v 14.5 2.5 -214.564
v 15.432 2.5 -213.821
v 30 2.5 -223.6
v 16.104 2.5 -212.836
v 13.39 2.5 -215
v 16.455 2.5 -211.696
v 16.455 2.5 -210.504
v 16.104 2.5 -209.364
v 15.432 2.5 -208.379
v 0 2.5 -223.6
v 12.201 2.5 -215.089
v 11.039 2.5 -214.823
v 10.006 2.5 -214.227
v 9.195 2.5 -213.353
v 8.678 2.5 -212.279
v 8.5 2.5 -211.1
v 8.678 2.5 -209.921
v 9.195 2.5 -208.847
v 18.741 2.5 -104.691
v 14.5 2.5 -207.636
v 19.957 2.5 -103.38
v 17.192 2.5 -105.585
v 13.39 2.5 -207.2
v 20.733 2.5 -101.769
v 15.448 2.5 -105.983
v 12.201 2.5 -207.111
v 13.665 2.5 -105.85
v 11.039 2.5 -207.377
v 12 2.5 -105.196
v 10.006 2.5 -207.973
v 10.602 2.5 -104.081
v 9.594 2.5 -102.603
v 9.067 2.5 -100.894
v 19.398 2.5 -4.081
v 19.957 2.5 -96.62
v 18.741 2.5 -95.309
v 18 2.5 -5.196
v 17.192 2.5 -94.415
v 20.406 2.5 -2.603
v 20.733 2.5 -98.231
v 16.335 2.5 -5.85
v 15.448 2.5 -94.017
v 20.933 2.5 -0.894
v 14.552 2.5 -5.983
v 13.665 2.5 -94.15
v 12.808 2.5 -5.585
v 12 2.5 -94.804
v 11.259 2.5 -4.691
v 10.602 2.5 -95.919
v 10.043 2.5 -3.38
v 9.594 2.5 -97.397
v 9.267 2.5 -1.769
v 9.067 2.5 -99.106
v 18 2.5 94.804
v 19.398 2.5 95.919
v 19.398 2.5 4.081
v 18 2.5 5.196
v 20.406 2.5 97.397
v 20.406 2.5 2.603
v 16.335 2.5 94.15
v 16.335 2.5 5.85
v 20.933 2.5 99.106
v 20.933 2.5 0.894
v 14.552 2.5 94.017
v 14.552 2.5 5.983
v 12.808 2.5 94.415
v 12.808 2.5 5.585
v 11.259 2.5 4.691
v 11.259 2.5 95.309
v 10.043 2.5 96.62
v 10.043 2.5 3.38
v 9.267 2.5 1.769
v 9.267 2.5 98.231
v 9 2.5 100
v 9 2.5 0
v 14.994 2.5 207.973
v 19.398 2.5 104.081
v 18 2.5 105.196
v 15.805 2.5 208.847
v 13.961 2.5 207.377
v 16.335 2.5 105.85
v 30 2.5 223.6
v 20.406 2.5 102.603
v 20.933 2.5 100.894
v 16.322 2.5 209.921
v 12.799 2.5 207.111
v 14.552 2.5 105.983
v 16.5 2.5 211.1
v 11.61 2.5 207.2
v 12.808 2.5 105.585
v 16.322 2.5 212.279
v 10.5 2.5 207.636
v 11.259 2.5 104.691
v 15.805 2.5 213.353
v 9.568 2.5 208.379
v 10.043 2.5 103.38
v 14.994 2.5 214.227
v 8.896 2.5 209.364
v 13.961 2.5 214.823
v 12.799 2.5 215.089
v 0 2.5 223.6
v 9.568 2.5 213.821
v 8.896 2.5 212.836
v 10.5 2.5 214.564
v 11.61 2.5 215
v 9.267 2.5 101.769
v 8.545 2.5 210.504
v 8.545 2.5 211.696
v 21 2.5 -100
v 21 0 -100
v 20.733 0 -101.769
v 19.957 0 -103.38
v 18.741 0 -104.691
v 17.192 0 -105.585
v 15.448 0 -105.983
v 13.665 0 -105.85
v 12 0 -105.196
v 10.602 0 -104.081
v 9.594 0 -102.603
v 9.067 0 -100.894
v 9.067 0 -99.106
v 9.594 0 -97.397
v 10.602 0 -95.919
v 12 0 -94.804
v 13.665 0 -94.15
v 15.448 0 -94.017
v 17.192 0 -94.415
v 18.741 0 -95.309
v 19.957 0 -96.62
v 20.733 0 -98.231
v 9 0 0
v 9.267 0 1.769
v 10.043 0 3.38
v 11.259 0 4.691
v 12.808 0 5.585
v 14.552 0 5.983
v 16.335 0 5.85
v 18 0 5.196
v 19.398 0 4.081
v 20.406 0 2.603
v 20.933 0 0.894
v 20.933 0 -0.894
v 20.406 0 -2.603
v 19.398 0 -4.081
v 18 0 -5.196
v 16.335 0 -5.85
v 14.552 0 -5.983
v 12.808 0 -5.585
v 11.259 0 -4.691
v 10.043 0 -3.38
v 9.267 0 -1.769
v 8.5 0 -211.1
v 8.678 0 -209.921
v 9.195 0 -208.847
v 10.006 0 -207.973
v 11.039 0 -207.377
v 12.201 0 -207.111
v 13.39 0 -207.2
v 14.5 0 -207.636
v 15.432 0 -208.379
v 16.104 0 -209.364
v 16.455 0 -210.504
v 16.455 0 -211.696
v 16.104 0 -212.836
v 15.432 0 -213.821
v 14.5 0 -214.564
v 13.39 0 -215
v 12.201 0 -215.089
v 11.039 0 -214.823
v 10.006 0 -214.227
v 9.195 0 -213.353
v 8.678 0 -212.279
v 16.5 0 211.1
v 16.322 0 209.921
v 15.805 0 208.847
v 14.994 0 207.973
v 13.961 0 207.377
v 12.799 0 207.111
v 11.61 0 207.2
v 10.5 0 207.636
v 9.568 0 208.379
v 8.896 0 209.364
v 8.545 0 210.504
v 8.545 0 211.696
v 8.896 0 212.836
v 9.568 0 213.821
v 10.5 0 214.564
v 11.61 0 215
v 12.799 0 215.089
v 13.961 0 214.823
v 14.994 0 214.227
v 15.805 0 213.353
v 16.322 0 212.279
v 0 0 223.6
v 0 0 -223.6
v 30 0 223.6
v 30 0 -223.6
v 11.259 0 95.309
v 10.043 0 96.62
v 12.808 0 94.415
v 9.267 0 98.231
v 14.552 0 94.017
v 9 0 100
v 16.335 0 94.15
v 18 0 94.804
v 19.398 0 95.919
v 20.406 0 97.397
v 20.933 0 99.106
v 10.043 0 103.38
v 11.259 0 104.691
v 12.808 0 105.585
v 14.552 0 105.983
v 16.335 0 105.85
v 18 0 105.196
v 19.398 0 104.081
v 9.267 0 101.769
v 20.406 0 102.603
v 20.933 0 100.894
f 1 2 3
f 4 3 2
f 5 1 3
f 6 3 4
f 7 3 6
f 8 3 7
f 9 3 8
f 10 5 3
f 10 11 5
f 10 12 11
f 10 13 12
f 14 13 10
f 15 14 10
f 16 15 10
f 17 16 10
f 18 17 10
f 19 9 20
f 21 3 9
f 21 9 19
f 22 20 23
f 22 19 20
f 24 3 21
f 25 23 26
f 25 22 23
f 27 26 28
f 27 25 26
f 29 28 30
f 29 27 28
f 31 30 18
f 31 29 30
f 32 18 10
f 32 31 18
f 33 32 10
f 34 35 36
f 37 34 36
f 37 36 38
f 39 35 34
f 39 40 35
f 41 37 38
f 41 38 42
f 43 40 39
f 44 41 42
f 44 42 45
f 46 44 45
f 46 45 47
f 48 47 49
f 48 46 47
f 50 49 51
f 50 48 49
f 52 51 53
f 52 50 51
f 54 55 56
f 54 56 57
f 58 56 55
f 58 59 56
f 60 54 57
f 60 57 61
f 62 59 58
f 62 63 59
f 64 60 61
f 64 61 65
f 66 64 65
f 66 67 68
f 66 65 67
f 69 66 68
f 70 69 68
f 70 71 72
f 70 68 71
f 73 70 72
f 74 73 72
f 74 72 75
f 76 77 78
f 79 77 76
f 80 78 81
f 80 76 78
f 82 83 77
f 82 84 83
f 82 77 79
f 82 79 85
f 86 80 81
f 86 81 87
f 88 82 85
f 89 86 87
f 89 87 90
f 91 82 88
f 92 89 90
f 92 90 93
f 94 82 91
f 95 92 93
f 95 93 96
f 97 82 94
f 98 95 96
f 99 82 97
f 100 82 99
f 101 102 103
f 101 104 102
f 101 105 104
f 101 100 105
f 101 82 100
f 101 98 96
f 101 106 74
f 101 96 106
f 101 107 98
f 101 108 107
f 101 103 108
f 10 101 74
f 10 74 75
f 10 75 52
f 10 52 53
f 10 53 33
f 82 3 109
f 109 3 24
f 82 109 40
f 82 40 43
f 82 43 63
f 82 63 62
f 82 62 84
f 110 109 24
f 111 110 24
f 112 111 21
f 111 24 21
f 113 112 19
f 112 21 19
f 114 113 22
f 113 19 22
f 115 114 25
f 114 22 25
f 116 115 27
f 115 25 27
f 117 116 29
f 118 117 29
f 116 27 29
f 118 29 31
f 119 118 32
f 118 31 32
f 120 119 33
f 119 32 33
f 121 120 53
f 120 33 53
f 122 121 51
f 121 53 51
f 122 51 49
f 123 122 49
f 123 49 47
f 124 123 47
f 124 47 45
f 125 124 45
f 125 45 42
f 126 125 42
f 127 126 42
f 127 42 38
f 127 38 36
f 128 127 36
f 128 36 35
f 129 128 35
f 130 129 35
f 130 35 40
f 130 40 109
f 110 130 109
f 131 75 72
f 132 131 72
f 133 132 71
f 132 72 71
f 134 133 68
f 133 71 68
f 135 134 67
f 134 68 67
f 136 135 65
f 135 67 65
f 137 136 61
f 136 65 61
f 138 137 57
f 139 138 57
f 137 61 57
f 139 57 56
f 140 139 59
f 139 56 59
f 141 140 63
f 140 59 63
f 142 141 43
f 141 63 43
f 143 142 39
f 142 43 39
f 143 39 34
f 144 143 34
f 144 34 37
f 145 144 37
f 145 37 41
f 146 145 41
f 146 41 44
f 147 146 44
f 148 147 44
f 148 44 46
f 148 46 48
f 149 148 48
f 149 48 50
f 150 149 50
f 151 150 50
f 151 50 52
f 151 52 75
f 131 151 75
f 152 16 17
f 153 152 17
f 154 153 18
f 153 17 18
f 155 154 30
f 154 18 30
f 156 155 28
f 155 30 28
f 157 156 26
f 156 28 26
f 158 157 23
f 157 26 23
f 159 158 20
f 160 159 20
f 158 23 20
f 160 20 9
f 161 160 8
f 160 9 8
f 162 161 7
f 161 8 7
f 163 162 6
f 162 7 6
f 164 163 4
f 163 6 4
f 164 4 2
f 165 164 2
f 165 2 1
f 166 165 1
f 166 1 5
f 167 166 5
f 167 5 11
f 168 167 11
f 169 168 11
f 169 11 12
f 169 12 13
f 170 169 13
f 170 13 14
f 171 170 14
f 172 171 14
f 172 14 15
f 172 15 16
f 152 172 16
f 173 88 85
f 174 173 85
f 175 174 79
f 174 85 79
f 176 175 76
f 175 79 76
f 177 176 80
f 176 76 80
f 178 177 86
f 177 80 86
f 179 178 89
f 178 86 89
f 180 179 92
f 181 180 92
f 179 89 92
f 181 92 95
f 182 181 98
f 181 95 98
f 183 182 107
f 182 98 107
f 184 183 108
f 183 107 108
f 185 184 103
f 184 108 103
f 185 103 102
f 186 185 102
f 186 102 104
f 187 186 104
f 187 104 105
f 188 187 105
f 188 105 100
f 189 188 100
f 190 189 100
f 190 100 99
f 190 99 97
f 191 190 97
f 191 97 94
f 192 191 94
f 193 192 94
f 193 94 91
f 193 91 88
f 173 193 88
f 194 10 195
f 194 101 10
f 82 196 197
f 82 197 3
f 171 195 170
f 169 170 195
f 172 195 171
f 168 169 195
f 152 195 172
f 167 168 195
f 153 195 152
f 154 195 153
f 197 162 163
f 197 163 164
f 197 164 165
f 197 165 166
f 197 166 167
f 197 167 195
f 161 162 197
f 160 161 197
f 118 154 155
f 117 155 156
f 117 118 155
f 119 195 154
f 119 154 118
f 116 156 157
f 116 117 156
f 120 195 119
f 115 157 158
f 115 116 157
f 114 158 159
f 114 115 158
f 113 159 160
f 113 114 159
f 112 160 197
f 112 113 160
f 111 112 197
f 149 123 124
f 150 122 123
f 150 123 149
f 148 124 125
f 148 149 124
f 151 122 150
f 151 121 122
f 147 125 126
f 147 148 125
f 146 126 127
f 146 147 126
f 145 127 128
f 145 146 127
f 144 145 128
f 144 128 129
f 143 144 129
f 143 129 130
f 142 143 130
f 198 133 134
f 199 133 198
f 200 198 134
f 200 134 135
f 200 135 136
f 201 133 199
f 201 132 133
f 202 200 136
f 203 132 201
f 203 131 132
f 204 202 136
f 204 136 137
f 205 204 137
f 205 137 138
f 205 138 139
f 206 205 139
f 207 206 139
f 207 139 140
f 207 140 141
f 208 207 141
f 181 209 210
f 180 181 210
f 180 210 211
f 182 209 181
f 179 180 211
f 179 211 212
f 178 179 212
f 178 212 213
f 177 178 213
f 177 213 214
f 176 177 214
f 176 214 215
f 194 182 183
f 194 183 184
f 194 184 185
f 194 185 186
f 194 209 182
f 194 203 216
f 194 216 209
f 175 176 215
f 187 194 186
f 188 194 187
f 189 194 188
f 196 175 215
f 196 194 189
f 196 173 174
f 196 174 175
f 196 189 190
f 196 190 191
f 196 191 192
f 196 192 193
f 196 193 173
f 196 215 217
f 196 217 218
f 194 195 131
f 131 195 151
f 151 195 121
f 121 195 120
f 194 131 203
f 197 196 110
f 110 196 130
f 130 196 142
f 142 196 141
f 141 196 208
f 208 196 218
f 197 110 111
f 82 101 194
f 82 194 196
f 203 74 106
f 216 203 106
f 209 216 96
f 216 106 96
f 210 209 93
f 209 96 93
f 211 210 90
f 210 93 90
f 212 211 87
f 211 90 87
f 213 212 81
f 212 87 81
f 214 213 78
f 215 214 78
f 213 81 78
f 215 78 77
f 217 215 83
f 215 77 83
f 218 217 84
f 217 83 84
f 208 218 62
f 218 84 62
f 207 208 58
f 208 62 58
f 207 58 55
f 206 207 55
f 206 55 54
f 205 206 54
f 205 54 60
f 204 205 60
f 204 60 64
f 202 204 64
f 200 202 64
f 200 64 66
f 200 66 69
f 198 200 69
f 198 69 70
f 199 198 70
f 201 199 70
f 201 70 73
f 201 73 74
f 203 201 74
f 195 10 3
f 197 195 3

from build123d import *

# Parameters (mm, degrees)
BOSS_EXTRUDE1_DEPTH = 223.6
SKETCH2_R           = 4
SKETCH2_R_2         = 6
CUT_EXTRUDE1_DEPTH  = 226.617397379


with BuildPart() as part:
    # Sketch1 → Boss-Extrude1 (new, symmetric)
    with BuildSketch(Plane.XY):
        Polygon((2.5, 2.5), (0, 2.5), (0, 0), (30, 0), (30, 2.5), align=None)
    extrude(amount=BOSS_EXTRUDE1_DEPTH, both=True)

    # Sketch2 → Cut-Extrude1 (cut, through all)
    with BuildSketch(Plane(origin=(0, 2.5, 0), x_dir=(1, 0, 0), z_dir=(0, 1, 0))):
        with Locations(Location((12.5, 211.1, 0), (0, 0, 180))):
            Circle(SKETCH2_R)
        with Locations((12.5, -211.1)):
            Circle(SKETCH2_R)
        with Locations(Location((15, -100, 0), (0, 0, 180))):
            Circle(SKETCH2_R_2)
        with Locations((15, 100)):
            Circle(SKETCH2_R_2)
        with Locations(Location((15, 0, 0), (0, 0, 180))):
            Circle(SKETCH2_R_2)
    extrude(amount=-CUT_EXTRUDE1_DEPTH, mode=Mode.SUBTRACT)


solid = part.part
